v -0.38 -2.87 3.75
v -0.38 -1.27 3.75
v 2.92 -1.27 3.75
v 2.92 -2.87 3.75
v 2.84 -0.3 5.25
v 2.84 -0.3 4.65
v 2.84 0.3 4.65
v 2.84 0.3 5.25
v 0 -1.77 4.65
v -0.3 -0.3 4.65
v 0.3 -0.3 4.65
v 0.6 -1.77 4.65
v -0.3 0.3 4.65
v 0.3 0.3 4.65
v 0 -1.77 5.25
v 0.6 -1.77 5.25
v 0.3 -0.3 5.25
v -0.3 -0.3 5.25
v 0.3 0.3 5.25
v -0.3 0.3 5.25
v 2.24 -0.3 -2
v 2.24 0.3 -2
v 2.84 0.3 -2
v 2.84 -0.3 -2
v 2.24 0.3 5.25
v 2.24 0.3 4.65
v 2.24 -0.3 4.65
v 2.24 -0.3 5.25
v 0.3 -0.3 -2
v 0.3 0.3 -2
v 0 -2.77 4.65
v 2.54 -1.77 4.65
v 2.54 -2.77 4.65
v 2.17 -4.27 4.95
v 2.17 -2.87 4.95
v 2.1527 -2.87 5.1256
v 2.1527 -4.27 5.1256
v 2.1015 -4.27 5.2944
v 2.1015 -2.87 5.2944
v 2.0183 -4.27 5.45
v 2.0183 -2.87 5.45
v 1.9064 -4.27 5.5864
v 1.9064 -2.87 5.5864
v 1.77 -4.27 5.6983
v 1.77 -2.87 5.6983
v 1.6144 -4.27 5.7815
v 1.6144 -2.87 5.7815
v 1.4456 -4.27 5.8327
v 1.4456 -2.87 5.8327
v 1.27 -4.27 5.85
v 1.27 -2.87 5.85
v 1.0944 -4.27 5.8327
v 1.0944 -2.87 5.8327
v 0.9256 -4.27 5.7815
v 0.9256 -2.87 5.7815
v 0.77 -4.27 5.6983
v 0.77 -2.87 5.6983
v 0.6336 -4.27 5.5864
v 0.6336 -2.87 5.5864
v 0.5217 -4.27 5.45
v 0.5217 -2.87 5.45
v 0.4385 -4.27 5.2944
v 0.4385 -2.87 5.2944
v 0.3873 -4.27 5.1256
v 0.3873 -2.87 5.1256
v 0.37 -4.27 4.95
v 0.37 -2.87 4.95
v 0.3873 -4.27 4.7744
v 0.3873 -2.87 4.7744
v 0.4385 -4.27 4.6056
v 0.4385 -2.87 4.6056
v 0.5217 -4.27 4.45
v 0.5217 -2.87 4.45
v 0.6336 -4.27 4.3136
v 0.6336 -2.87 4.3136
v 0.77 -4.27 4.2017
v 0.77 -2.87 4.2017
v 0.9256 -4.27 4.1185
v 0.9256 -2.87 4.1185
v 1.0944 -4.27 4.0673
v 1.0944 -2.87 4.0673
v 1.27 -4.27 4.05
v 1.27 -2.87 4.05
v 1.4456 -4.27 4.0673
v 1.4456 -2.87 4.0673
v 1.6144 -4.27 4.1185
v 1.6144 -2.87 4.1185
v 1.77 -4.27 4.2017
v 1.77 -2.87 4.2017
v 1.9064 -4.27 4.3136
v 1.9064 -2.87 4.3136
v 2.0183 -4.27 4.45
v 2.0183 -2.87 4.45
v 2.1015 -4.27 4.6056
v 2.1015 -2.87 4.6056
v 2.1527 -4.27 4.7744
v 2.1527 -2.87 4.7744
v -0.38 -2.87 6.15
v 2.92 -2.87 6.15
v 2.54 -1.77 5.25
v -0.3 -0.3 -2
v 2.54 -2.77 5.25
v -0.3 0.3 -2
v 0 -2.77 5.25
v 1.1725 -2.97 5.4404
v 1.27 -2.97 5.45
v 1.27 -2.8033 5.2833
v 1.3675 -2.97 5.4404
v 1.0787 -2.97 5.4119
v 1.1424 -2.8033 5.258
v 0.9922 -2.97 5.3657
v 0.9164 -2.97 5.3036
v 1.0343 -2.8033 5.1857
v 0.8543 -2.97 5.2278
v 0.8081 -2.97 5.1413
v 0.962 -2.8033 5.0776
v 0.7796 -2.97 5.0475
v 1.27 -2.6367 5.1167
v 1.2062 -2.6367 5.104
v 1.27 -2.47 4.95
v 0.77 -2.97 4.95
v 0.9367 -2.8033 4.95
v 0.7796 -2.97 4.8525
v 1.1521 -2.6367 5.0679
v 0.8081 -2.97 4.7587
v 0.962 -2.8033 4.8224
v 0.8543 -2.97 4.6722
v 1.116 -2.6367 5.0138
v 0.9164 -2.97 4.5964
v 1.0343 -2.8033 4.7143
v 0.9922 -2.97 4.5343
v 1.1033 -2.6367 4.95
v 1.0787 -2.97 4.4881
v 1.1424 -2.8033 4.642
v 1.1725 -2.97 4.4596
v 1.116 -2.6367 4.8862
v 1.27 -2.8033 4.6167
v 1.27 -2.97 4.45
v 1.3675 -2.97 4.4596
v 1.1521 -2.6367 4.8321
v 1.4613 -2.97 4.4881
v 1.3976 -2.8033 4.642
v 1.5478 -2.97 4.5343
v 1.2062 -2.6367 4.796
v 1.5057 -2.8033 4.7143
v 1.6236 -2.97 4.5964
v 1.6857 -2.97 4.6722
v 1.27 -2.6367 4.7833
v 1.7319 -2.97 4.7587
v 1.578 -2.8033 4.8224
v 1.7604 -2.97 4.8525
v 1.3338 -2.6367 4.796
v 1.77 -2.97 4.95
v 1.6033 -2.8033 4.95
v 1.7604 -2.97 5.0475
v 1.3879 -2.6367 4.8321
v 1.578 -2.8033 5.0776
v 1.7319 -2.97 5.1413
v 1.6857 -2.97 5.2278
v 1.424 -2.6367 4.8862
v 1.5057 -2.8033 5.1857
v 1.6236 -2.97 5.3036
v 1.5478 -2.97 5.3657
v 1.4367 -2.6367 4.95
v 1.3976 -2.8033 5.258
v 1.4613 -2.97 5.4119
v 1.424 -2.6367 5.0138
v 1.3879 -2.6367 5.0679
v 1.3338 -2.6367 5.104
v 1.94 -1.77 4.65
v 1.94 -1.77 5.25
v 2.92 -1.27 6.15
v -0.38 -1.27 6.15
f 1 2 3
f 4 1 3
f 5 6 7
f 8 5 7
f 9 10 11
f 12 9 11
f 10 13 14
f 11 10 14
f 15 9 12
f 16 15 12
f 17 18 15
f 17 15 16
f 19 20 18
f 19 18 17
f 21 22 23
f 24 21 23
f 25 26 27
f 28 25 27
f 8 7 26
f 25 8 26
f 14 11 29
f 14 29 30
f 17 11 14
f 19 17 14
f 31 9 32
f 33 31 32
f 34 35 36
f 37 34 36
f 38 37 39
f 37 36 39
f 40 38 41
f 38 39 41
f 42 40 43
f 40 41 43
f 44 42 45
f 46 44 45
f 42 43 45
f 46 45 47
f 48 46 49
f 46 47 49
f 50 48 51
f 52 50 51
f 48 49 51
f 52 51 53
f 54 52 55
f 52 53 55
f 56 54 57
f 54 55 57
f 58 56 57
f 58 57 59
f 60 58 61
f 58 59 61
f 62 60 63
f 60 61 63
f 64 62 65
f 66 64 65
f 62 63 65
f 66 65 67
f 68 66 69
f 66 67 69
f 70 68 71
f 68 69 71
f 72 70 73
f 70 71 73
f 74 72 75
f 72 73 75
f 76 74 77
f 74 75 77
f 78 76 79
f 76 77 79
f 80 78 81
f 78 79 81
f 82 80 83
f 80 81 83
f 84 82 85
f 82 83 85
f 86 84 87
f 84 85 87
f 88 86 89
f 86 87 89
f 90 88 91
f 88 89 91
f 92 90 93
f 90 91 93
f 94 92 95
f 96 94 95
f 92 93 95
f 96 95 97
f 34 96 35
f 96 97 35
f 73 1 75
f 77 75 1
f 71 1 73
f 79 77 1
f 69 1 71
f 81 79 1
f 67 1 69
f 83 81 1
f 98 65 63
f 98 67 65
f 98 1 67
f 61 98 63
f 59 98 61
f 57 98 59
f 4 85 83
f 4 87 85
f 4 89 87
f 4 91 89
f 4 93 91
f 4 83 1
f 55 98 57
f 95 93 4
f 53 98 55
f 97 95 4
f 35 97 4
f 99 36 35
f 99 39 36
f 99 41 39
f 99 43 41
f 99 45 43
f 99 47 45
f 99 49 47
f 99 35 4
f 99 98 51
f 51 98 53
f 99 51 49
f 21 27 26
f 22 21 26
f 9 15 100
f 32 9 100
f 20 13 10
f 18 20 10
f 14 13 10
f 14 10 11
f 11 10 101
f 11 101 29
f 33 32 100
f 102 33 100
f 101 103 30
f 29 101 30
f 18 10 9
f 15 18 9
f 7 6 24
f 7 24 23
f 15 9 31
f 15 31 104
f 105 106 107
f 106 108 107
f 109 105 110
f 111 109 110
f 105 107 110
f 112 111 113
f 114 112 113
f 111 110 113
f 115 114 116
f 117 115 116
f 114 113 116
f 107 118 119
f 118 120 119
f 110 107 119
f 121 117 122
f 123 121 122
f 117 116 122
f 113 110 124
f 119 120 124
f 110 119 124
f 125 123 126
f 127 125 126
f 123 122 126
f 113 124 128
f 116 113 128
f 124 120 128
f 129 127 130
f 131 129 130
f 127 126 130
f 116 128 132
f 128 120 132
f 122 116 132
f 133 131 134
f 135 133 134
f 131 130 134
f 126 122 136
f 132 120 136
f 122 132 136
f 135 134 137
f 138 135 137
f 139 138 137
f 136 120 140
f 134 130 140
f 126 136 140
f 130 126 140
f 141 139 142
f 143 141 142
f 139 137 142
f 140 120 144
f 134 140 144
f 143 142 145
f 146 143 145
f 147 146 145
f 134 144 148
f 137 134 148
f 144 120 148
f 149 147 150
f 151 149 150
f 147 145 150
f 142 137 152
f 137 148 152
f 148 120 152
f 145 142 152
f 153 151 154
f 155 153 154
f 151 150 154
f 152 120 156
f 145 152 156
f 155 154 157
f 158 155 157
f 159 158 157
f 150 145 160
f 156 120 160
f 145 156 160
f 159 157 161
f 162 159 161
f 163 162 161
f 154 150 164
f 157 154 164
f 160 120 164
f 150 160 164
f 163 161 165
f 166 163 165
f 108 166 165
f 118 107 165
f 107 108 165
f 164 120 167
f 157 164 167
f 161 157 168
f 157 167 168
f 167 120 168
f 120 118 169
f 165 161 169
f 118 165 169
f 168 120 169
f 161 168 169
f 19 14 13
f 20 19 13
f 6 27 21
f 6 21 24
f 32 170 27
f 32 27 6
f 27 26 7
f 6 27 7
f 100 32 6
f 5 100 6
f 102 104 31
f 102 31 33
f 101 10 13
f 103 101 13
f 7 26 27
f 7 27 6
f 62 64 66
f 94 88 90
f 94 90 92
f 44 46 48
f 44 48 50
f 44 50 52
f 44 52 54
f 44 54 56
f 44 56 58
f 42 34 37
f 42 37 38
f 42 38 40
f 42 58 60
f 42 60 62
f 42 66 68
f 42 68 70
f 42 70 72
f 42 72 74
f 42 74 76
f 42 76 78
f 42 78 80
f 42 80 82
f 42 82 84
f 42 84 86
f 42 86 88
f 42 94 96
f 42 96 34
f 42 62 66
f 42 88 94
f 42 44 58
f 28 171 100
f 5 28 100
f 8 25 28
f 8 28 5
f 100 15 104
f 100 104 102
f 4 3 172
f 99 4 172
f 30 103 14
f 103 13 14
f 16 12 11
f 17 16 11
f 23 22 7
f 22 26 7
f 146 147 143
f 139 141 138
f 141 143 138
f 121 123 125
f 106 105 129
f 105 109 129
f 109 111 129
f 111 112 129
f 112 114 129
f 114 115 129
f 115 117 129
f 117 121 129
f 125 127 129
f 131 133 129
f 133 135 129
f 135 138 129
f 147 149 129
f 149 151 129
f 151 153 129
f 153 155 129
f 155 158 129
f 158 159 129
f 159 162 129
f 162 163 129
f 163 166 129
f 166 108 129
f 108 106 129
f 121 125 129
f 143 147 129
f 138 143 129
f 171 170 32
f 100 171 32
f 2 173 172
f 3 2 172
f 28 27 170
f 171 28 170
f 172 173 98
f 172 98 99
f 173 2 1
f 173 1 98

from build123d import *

# Parameters (mm, degrees)
SKETCH_W       = 0.6
SKETCH_H       = 0.6
PAD_DEPTH      = 4.65
PAD_DEPTH_BACK = 2
PAD001_DEPTH   = 0.6
SKETCH002_W    = 2.54
SKETCH002_H    = 0.6
PAD002_DEPTH   = 1
SKETCH004_W    = 3.3
SKETCH004_H    = 2.4
PAD003_DEPTH   = 1.6
SKETCH006_R    = 0.9
PAD004_DEPTH   = 1.4


with BuildPart() as pad:
    # Sketch → Pad (new body, two sides)
    with BuildSketch(Plane.XY) as pad_sk:
        Rectangle(SKETCH_W, SKETCH_H)
        with Locations((2.54, 0)):
            Rectangle(SKETCH_W, SKETCH_H)
    extrude(amount=PAD_DEPTH)
    extrude(pad_sk.sketch, amount=-PAD_DEPTH_BACK)


with BuildPart() as pad001:
    # Sketch001 → Pad001 (new body)
    with BuildSketch(Plane.XY.offset(4.65)):
        Polygon((0.3, 0.3), (-0.3, 0.3), (-0.3, -0.3), (0, -1.77), (0.6, -1.77), (0.3, -0.3), align=None)
        Polygon((2.84, 0.3), (2.24, 0.3), (2.24, -0.3), (1.94, -1.77), (2.54, -1.77), (2.84, -0.3), align=None)
    extrude(amount=PAD001_DEPTH)


with BuildPart() as pad002:
    # Sketch002 → Pad002 (new body)
    with BuildSketch(Plane.XZ.offset(1.77)):
        with Locations((1.27, 4.95)):
            Rectangle(SKETCH002_W, SKETCH002_H)
    extrude(amount=PAD002_DEPTH)


with BuildPart() as revolution001:
    # Sketch005 → Revolution001 (revolve)
    with BuildSketch(Plane.YZ.offset(1.27)):
        Polygon((-2.47, 4.95), (-2.97, 4.95), (-2.97, 5.45), align=None)
    revolve(axis=Axis((1.27, -3.977201, 4.95), (0, -1, 0)))


with BuildPart() as pad004:
    # Sketch004 → Pad003 (new body)
    with BuildSketch(Plane.XZ.offset(1.27)):
        with Locations((1.27, 4.95)):
            Rectangle(SKETCH004_W, SKETCH004_H)
    extrude(amount=PAD003_DEPTH)

    # Sketch006 → Pad004 (new body)
    with BuildSketch(Plane.XZ.offset(2.87)):
        with Locations((1.27, 4.95)):
            Circle(SKETCH006_R)
    extrude(amount=PAD004_DEPTH)


solid = Compound([pad.part, pad001.part, pad002.part, revolution001.part, pad004.part])
